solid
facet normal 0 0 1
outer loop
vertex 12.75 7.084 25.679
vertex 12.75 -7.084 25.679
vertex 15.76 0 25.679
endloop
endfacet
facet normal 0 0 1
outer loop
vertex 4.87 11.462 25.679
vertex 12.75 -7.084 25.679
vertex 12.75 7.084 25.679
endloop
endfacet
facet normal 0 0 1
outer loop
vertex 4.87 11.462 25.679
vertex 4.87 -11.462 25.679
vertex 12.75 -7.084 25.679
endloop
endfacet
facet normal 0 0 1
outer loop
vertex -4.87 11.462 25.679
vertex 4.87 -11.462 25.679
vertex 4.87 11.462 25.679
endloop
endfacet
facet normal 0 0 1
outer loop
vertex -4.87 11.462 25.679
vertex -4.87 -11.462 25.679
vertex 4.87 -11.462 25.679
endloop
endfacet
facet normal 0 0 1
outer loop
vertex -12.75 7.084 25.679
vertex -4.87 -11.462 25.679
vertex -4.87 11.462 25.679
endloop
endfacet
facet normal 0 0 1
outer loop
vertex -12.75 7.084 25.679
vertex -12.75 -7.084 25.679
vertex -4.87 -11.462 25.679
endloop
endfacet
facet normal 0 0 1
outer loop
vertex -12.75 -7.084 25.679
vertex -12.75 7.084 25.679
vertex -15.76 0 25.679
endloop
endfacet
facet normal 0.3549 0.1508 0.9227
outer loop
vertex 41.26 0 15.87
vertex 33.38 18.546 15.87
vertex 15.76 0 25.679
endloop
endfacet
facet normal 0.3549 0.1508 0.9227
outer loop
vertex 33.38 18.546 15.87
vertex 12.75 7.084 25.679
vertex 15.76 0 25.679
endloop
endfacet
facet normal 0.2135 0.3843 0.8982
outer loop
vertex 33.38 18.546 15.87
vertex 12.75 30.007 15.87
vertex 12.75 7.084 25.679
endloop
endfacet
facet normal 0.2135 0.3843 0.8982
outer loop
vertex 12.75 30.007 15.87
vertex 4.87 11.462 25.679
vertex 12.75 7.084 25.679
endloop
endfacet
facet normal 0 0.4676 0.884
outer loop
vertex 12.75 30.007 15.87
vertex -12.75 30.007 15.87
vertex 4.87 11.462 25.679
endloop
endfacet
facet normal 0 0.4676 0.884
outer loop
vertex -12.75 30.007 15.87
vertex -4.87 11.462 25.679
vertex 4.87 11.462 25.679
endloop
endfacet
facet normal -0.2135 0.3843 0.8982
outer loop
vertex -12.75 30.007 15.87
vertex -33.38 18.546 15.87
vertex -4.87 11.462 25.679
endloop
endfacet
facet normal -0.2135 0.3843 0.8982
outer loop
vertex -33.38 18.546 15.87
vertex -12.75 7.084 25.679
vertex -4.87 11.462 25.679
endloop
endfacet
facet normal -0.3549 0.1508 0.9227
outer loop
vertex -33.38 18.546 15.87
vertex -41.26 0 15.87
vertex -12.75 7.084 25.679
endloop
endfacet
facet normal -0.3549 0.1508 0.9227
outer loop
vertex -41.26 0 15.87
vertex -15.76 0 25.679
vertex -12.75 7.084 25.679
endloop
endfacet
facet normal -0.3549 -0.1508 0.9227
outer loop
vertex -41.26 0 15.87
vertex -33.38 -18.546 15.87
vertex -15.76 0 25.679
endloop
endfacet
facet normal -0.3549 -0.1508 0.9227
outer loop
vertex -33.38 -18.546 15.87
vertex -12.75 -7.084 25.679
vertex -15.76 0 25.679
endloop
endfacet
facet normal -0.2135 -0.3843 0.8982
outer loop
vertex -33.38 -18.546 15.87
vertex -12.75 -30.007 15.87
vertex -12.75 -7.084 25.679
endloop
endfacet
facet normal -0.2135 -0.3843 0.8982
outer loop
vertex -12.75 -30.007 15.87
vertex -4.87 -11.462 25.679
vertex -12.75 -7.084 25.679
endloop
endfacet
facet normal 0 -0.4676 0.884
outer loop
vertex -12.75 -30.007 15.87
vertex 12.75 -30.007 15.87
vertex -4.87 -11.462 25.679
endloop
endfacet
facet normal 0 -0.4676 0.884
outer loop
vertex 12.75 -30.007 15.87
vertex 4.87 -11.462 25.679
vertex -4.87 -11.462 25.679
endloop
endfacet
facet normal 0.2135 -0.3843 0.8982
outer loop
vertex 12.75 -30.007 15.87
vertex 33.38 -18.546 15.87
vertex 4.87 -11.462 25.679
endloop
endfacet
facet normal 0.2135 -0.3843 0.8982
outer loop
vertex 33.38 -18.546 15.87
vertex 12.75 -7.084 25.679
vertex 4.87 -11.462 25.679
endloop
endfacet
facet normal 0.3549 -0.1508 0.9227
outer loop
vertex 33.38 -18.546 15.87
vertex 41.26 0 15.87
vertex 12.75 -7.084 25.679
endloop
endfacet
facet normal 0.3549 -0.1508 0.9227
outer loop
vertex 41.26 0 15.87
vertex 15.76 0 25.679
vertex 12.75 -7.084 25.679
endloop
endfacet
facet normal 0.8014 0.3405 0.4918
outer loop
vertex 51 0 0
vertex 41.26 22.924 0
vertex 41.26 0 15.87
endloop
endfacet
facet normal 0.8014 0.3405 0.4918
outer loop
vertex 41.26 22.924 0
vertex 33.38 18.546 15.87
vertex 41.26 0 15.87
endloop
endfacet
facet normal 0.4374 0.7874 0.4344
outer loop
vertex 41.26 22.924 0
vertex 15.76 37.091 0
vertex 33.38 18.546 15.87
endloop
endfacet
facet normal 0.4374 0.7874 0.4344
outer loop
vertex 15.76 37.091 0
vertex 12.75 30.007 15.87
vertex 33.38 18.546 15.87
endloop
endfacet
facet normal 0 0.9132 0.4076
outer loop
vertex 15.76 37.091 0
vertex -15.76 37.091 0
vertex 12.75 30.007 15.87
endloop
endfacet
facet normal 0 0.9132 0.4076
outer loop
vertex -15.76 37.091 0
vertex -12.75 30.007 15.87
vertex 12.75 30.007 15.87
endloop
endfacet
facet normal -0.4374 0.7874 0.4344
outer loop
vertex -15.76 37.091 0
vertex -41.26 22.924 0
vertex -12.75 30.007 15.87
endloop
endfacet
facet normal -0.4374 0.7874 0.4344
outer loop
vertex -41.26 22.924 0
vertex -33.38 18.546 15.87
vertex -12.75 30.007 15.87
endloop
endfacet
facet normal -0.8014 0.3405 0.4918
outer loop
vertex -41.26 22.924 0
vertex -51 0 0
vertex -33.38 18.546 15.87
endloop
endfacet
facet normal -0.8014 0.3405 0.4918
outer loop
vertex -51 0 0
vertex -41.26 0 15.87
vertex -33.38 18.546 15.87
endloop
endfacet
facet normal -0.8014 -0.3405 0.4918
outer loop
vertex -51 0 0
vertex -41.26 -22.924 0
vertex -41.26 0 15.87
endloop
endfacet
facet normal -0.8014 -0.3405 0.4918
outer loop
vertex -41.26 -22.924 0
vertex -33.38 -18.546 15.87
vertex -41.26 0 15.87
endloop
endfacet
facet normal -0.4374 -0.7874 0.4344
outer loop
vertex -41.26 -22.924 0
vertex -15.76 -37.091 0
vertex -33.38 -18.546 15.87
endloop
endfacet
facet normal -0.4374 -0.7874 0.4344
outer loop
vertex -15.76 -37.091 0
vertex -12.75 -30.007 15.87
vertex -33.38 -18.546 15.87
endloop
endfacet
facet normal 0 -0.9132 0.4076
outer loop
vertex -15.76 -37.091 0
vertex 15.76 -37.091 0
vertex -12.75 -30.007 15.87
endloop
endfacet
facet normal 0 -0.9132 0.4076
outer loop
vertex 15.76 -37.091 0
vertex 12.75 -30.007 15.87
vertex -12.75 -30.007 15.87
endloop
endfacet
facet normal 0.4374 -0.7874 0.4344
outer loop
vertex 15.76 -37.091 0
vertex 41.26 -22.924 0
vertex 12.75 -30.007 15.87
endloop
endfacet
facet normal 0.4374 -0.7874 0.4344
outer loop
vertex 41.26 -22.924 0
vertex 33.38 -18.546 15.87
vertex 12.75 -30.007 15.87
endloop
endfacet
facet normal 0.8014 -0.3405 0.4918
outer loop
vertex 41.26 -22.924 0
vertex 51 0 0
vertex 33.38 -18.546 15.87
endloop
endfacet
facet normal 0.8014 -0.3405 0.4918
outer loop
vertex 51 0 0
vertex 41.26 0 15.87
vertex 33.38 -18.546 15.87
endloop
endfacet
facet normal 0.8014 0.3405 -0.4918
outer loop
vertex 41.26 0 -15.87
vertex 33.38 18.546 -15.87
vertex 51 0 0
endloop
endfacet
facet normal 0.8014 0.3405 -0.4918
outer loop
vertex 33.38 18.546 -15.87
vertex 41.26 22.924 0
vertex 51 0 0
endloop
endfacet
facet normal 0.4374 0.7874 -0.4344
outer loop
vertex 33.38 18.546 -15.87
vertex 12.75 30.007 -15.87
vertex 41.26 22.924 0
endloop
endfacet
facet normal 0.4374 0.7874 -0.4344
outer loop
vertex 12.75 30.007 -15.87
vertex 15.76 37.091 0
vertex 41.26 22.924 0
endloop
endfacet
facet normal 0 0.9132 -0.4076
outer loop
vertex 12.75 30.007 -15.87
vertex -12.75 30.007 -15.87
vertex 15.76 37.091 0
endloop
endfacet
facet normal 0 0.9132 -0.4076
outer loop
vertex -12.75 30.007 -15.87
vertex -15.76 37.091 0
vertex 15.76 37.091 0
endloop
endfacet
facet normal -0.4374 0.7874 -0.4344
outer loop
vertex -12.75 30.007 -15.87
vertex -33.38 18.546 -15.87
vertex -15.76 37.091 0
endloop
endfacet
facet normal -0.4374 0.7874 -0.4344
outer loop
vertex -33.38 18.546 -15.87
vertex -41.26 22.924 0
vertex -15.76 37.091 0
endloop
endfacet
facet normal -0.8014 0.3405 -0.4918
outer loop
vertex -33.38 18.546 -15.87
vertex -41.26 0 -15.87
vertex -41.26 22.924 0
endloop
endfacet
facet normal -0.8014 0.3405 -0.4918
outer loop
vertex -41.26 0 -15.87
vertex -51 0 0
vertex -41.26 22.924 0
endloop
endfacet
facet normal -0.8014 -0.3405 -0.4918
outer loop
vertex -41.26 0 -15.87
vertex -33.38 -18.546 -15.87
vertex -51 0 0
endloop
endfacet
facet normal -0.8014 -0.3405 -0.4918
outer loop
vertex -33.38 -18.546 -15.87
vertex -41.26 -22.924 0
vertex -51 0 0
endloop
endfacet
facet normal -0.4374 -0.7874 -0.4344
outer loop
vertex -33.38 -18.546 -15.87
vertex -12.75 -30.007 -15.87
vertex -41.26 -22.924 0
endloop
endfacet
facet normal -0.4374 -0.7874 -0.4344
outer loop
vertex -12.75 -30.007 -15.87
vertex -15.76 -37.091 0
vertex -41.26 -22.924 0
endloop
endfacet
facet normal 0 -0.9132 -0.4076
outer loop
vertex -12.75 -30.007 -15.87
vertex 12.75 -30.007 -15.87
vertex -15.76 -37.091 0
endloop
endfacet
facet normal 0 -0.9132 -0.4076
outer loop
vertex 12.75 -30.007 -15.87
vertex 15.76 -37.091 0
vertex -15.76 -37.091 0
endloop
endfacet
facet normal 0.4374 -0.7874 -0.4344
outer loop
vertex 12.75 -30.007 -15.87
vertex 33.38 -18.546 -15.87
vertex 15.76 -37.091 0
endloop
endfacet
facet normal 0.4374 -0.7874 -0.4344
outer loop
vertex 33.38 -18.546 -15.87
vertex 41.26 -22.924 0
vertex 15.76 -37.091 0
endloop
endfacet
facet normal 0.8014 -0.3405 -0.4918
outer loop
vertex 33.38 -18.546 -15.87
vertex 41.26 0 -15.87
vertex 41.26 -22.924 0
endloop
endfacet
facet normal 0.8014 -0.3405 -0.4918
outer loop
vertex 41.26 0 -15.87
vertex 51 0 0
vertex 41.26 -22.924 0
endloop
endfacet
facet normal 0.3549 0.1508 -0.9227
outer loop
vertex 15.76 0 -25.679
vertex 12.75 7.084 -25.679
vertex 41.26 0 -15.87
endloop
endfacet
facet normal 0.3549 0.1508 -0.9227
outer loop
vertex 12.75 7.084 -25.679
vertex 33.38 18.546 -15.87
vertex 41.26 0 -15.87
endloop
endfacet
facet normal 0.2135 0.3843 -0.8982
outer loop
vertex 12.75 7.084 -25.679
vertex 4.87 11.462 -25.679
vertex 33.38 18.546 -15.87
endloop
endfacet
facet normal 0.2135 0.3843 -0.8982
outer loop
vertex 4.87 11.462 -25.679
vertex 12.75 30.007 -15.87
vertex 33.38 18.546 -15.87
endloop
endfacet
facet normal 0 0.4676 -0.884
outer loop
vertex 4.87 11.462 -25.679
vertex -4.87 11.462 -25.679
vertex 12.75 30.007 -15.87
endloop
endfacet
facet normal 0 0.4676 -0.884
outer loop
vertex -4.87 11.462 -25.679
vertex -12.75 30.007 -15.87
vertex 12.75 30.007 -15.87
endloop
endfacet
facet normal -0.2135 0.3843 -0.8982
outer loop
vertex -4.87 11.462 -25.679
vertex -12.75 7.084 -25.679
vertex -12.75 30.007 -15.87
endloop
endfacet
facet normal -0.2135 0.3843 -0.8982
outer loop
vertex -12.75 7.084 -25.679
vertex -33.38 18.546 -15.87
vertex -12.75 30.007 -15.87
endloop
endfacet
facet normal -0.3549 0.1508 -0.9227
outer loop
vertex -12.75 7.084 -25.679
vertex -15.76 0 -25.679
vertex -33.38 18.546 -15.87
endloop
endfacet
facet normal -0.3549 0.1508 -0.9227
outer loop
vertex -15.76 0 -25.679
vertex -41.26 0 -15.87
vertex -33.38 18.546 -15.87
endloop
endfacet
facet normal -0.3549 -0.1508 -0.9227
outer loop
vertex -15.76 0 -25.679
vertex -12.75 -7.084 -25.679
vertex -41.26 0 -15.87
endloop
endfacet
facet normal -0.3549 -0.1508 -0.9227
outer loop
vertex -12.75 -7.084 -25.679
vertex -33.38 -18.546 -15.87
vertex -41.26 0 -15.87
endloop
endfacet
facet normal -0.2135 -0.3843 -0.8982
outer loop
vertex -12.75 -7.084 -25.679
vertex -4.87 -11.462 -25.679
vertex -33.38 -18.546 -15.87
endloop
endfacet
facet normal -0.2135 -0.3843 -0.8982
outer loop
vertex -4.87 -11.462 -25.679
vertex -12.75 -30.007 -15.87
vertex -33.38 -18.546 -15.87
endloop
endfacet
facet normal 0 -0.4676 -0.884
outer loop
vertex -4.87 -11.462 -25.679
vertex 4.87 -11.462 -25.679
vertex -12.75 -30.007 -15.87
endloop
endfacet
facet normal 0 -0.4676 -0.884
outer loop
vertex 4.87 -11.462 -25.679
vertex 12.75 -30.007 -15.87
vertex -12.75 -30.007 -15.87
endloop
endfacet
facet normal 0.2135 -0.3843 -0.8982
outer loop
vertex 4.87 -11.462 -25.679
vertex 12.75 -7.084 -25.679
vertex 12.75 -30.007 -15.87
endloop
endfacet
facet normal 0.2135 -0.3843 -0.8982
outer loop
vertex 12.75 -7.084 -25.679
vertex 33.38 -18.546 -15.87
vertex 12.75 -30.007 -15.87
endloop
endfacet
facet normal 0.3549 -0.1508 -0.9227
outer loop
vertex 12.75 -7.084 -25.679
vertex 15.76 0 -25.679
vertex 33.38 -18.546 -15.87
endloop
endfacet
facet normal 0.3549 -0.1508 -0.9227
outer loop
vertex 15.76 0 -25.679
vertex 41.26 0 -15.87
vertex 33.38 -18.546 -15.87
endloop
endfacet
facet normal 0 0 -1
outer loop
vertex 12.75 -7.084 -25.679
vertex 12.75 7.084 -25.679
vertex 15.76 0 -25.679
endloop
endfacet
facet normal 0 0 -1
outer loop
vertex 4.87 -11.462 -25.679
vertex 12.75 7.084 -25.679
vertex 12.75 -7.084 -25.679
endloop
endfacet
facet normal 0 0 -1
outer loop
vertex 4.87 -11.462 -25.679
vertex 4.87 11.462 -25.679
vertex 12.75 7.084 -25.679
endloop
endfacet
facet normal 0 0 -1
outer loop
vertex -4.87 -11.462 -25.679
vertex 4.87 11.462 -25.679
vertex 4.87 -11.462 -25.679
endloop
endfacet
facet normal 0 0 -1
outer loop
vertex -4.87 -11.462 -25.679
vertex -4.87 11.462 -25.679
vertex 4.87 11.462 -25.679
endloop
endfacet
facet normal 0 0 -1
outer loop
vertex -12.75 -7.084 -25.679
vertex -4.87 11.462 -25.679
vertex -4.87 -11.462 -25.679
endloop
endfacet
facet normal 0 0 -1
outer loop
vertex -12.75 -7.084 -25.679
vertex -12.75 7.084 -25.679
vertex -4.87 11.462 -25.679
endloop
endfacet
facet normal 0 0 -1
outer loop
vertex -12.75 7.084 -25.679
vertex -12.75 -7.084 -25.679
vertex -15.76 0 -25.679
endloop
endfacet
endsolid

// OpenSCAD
// Generated by SolidPython 1.0.1 on 2020-07-29 00:46:53


scale(v = [17, 13, 9]) {
	sphere(r = 3);
}
/***********************************************
*********      SolidPython code:      **********
************************************************
 
# import packages: SolidPython
from solid import *
from solid.utils import *
from itertools import chain, combinations, permutations


class Resize:

    def __init__(self, scad_file):
        self.scad_file = scad_file
        #self.scad_file = import_scad(scad_file)
        # cone/cylinder param:
        self.r1 = 0
        self.r2 = 0
        self.h = 0
        # rectangular prism param:
        self.w = 0
        self.l = 0
        # ellipse param:
        self.r = 0

    # import OpenScad code (file name corresponds to shape)


    # classify shape + parameters
    def assign(self, param1, param2, param3):
        if self.scad_file == 'cone.scad':
            self.r1 = param1
            self.r2 = param2
            self.h = param3
        elif self.scad_file == 'cylinder.scad':
            self.r1 = param1
            self.r2 = param2
            self.h = param3
        elif self.scad_file == 'rectangularPrism.scad':
            self.h = param1
            self.l = param2
            self.w = param3
        else:
            self.r = param1
            self.h = param2

    # resize parameters
    def iterate(self):
        x = range(3, 20, 2)
        i = 1
        if self.scad_file == 'cone.scad':
            tempList = list(permutations(x, 2))
            for temp in tempList:
                param1 = temp[0]
                param2 = temp[1]
                filepath = 'produced_scad_files/' + 'cone' + str(param1) + '_' + str(param2) + '_' + '.scad'
                scad_render_to_file(cylinder(h=param1, r1=param2, r2=0), filepath)

        elif self.scad_file == 'cylinder.scad':
            tempList = list(permutations(x, 3))
            for temp in tempList:
                param1 = temp[0]
                param2 = temp[1]
                filepath = 'produced_scad_files/' + 'cylinder' + str(param1) + '_' + str(param2) + '_' + '.scad'
                scad_render_to_file(cylinder(h=param1, r1=param2, r2=param2), filepath)

        elif self.scad_file == 'rectangularPrism.scad':
            tempList = list(permutations(x, 3))
            for temp in tempList:
                param1 = temp[0]
                param2 = temp[1]
                param3 = temp[2]
                filepath = 'produced_scad_files/' + 'rectangularPrism' + str(param1) + '_' + str(param2) + '_' + str(
                    param3) + '.scad'
                scad_render_to_file(cube(size=(param1, param2, param3)), filepath)

        elif self.scad_file == 'ellipse.scad':
            tempList = list(permutations(x, 4))
            for temp in tempList:
                param1 = temp[0]
                param2 = temp[1]
                param3 = temp[2]
                param4 = temp[3]
                filepath = 'produced_scad_files/' + 'ellipse' + str(param1) + '_' + str(param2) + '_' + str(param3) + '_' + str(param4) + '.scad'
                scad_render_to_file(scale([param1, param2, param3])(sphere(r=param4)), filepath)

    def render_to_scadfile(self):
        scad_render_to_file(scad, 'example.scad') 
 
************************************************/
